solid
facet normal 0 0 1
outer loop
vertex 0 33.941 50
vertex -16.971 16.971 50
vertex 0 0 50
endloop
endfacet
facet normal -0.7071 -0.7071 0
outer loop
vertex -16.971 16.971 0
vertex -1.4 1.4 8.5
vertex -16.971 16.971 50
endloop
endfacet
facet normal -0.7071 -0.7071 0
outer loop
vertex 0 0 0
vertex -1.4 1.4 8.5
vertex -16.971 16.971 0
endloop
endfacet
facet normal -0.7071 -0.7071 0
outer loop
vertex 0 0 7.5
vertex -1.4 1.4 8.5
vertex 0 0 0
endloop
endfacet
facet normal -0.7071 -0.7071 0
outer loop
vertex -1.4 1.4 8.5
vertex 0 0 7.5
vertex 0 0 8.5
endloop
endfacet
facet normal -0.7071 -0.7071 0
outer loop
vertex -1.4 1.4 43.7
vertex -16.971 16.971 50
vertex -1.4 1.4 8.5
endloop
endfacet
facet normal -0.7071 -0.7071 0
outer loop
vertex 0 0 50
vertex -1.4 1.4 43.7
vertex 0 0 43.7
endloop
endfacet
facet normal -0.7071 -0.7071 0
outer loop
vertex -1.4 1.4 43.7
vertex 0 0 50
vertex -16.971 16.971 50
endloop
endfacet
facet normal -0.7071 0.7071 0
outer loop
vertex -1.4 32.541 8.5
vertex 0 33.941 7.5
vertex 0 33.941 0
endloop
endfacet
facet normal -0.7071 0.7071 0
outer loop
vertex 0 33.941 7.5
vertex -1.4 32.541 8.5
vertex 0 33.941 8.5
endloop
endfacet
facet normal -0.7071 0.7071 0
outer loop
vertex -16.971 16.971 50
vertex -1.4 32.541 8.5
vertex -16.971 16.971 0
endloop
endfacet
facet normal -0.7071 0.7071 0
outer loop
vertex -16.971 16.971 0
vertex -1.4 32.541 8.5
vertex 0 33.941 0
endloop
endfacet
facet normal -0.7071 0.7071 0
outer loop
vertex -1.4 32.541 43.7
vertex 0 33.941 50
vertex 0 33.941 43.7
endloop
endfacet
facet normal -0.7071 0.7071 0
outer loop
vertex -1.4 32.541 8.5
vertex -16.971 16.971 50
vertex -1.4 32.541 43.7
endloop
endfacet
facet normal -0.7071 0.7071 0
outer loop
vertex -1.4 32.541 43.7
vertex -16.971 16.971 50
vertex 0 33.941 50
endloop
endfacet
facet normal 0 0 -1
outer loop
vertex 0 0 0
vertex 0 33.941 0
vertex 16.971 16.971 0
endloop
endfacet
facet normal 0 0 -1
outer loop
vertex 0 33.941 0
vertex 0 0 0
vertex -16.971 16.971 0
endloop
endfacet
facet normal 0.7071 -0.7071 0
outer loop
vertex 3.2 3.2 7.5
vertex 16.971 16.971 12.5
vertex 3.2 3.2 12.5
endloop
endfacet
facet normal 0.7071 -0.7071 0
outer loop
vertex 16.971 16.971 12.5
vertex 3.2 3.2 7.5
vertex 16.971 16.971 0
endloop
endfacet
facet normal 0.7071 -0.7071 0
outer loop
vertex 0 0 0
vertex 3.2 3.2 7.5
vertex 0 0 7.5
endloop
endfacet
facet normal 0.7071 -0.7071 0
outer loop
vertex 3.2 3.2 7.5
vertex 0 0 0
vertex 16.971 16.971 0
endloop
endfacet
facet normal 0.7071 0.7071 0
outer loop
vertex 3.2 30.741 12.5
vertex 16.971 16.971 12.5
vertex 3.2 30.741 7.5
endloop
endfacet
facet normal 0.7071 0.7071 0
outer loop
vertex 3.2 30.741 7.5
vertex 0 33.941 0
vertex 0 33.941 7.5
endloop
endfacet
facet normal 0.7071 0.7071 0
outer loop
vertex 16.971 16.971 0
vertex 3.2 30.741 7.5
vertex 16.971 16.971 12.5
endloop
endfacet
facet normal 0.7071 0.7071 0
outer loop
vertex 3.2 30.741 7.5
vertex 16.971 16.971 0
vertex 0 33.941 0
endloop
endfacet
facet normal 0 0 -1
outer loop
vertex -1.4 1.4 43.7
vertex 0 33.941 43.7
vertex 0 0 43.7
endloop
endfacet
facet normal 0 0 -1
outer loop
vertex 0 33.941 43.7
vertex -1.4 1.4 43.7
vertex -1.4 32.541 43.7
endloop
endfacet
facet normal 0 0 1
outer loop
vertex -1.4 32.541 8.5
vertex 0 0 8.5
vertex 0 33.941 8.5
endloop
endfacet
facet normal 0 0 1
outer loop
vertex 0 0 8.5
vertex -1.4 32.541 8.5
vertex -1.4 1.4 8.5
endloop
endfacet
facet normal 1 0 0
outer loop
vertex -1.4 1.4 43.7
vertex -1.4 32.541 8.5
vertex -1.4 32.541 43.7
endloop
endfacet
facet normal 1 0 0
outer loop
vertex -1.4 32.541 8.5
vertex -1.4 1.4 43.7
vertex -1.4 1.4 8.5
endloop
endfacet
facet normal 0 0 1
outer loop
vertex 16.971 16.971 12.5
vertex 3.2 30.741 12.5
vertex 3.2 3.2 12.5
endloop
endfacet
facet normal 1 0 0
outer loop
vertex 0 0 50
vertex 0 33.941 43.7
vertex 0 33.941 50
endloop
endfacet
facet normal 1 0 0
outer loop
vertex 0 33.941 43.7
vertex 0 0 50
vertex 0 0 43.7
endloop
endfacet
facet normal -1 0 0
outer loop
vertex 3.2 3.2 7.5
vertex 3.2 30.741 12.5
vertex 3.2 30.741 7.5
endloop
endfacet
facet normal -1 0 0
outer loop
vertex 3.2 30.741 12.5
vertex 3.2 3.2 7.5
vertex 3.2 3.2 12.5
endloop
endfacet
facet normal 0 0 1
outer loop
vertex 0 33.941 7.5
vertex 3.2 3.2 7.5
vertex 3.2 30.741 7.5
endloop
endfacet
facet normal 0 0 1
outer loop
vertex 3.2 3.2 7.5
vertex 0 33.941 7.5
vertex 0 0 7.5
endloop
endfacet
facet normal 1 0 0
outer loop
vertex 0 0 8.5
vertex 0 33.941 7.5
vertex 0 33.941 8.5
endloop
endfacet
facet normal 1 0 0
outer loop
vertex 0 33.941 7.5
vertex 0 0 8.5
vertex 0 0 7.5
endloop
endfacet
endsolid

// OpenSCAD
// Microscope slide holder for RF-6000 Spectrofluorophotometer

// Units are mm
// Parameters
slide_depth = 1; // Thickness of slide
stage_bottom = 12.5; // location of start of cut, 
slide_bottom = 8.5; // where slide will rest
slide_width = 35; // in this case, it will be the height, slides are about 25 mm wide, but larger will allow the slide to move around

post_width = 24; // square base
post_height = 50;

shroud_thickness = 3;
notch = 5;

tolerance = 0.2; // for gaps to allow slide to pass

// Derived parameters
hypotenuse = ((2*(post_width^2))^(0.5));

difference() {
    rotate([0,0,45])
    cube([post_width, post_width, post_height]);

    // Cutting out the stage
    rotate([0,0,0])
    translate([-(slide_depth+(2*tolerance)),0,slide_bottom]) // leave a base
    cube([slide_depth+(3*tolerance),1+hypotenuse,(tolerance+slide_width)]); // leading +1 are for extra
    
    // cut off the top
    rotate([0,0,0])
    translate([0,0,stage_bottom]) // leave a base
    cube([1+hypotenuse/2,1+hypotenuse,(1+post_height-slide_bottom)]); // leading +1 are for extra
    
    // notch for shroud
    rotate([0,0,0])
    translate([0,0,stage_bottom-notch])
    cube([shroud_thickness+tolerance,1+hypotenuse,(tolerance+slide_width)]); // leading +1 are for extra
}
